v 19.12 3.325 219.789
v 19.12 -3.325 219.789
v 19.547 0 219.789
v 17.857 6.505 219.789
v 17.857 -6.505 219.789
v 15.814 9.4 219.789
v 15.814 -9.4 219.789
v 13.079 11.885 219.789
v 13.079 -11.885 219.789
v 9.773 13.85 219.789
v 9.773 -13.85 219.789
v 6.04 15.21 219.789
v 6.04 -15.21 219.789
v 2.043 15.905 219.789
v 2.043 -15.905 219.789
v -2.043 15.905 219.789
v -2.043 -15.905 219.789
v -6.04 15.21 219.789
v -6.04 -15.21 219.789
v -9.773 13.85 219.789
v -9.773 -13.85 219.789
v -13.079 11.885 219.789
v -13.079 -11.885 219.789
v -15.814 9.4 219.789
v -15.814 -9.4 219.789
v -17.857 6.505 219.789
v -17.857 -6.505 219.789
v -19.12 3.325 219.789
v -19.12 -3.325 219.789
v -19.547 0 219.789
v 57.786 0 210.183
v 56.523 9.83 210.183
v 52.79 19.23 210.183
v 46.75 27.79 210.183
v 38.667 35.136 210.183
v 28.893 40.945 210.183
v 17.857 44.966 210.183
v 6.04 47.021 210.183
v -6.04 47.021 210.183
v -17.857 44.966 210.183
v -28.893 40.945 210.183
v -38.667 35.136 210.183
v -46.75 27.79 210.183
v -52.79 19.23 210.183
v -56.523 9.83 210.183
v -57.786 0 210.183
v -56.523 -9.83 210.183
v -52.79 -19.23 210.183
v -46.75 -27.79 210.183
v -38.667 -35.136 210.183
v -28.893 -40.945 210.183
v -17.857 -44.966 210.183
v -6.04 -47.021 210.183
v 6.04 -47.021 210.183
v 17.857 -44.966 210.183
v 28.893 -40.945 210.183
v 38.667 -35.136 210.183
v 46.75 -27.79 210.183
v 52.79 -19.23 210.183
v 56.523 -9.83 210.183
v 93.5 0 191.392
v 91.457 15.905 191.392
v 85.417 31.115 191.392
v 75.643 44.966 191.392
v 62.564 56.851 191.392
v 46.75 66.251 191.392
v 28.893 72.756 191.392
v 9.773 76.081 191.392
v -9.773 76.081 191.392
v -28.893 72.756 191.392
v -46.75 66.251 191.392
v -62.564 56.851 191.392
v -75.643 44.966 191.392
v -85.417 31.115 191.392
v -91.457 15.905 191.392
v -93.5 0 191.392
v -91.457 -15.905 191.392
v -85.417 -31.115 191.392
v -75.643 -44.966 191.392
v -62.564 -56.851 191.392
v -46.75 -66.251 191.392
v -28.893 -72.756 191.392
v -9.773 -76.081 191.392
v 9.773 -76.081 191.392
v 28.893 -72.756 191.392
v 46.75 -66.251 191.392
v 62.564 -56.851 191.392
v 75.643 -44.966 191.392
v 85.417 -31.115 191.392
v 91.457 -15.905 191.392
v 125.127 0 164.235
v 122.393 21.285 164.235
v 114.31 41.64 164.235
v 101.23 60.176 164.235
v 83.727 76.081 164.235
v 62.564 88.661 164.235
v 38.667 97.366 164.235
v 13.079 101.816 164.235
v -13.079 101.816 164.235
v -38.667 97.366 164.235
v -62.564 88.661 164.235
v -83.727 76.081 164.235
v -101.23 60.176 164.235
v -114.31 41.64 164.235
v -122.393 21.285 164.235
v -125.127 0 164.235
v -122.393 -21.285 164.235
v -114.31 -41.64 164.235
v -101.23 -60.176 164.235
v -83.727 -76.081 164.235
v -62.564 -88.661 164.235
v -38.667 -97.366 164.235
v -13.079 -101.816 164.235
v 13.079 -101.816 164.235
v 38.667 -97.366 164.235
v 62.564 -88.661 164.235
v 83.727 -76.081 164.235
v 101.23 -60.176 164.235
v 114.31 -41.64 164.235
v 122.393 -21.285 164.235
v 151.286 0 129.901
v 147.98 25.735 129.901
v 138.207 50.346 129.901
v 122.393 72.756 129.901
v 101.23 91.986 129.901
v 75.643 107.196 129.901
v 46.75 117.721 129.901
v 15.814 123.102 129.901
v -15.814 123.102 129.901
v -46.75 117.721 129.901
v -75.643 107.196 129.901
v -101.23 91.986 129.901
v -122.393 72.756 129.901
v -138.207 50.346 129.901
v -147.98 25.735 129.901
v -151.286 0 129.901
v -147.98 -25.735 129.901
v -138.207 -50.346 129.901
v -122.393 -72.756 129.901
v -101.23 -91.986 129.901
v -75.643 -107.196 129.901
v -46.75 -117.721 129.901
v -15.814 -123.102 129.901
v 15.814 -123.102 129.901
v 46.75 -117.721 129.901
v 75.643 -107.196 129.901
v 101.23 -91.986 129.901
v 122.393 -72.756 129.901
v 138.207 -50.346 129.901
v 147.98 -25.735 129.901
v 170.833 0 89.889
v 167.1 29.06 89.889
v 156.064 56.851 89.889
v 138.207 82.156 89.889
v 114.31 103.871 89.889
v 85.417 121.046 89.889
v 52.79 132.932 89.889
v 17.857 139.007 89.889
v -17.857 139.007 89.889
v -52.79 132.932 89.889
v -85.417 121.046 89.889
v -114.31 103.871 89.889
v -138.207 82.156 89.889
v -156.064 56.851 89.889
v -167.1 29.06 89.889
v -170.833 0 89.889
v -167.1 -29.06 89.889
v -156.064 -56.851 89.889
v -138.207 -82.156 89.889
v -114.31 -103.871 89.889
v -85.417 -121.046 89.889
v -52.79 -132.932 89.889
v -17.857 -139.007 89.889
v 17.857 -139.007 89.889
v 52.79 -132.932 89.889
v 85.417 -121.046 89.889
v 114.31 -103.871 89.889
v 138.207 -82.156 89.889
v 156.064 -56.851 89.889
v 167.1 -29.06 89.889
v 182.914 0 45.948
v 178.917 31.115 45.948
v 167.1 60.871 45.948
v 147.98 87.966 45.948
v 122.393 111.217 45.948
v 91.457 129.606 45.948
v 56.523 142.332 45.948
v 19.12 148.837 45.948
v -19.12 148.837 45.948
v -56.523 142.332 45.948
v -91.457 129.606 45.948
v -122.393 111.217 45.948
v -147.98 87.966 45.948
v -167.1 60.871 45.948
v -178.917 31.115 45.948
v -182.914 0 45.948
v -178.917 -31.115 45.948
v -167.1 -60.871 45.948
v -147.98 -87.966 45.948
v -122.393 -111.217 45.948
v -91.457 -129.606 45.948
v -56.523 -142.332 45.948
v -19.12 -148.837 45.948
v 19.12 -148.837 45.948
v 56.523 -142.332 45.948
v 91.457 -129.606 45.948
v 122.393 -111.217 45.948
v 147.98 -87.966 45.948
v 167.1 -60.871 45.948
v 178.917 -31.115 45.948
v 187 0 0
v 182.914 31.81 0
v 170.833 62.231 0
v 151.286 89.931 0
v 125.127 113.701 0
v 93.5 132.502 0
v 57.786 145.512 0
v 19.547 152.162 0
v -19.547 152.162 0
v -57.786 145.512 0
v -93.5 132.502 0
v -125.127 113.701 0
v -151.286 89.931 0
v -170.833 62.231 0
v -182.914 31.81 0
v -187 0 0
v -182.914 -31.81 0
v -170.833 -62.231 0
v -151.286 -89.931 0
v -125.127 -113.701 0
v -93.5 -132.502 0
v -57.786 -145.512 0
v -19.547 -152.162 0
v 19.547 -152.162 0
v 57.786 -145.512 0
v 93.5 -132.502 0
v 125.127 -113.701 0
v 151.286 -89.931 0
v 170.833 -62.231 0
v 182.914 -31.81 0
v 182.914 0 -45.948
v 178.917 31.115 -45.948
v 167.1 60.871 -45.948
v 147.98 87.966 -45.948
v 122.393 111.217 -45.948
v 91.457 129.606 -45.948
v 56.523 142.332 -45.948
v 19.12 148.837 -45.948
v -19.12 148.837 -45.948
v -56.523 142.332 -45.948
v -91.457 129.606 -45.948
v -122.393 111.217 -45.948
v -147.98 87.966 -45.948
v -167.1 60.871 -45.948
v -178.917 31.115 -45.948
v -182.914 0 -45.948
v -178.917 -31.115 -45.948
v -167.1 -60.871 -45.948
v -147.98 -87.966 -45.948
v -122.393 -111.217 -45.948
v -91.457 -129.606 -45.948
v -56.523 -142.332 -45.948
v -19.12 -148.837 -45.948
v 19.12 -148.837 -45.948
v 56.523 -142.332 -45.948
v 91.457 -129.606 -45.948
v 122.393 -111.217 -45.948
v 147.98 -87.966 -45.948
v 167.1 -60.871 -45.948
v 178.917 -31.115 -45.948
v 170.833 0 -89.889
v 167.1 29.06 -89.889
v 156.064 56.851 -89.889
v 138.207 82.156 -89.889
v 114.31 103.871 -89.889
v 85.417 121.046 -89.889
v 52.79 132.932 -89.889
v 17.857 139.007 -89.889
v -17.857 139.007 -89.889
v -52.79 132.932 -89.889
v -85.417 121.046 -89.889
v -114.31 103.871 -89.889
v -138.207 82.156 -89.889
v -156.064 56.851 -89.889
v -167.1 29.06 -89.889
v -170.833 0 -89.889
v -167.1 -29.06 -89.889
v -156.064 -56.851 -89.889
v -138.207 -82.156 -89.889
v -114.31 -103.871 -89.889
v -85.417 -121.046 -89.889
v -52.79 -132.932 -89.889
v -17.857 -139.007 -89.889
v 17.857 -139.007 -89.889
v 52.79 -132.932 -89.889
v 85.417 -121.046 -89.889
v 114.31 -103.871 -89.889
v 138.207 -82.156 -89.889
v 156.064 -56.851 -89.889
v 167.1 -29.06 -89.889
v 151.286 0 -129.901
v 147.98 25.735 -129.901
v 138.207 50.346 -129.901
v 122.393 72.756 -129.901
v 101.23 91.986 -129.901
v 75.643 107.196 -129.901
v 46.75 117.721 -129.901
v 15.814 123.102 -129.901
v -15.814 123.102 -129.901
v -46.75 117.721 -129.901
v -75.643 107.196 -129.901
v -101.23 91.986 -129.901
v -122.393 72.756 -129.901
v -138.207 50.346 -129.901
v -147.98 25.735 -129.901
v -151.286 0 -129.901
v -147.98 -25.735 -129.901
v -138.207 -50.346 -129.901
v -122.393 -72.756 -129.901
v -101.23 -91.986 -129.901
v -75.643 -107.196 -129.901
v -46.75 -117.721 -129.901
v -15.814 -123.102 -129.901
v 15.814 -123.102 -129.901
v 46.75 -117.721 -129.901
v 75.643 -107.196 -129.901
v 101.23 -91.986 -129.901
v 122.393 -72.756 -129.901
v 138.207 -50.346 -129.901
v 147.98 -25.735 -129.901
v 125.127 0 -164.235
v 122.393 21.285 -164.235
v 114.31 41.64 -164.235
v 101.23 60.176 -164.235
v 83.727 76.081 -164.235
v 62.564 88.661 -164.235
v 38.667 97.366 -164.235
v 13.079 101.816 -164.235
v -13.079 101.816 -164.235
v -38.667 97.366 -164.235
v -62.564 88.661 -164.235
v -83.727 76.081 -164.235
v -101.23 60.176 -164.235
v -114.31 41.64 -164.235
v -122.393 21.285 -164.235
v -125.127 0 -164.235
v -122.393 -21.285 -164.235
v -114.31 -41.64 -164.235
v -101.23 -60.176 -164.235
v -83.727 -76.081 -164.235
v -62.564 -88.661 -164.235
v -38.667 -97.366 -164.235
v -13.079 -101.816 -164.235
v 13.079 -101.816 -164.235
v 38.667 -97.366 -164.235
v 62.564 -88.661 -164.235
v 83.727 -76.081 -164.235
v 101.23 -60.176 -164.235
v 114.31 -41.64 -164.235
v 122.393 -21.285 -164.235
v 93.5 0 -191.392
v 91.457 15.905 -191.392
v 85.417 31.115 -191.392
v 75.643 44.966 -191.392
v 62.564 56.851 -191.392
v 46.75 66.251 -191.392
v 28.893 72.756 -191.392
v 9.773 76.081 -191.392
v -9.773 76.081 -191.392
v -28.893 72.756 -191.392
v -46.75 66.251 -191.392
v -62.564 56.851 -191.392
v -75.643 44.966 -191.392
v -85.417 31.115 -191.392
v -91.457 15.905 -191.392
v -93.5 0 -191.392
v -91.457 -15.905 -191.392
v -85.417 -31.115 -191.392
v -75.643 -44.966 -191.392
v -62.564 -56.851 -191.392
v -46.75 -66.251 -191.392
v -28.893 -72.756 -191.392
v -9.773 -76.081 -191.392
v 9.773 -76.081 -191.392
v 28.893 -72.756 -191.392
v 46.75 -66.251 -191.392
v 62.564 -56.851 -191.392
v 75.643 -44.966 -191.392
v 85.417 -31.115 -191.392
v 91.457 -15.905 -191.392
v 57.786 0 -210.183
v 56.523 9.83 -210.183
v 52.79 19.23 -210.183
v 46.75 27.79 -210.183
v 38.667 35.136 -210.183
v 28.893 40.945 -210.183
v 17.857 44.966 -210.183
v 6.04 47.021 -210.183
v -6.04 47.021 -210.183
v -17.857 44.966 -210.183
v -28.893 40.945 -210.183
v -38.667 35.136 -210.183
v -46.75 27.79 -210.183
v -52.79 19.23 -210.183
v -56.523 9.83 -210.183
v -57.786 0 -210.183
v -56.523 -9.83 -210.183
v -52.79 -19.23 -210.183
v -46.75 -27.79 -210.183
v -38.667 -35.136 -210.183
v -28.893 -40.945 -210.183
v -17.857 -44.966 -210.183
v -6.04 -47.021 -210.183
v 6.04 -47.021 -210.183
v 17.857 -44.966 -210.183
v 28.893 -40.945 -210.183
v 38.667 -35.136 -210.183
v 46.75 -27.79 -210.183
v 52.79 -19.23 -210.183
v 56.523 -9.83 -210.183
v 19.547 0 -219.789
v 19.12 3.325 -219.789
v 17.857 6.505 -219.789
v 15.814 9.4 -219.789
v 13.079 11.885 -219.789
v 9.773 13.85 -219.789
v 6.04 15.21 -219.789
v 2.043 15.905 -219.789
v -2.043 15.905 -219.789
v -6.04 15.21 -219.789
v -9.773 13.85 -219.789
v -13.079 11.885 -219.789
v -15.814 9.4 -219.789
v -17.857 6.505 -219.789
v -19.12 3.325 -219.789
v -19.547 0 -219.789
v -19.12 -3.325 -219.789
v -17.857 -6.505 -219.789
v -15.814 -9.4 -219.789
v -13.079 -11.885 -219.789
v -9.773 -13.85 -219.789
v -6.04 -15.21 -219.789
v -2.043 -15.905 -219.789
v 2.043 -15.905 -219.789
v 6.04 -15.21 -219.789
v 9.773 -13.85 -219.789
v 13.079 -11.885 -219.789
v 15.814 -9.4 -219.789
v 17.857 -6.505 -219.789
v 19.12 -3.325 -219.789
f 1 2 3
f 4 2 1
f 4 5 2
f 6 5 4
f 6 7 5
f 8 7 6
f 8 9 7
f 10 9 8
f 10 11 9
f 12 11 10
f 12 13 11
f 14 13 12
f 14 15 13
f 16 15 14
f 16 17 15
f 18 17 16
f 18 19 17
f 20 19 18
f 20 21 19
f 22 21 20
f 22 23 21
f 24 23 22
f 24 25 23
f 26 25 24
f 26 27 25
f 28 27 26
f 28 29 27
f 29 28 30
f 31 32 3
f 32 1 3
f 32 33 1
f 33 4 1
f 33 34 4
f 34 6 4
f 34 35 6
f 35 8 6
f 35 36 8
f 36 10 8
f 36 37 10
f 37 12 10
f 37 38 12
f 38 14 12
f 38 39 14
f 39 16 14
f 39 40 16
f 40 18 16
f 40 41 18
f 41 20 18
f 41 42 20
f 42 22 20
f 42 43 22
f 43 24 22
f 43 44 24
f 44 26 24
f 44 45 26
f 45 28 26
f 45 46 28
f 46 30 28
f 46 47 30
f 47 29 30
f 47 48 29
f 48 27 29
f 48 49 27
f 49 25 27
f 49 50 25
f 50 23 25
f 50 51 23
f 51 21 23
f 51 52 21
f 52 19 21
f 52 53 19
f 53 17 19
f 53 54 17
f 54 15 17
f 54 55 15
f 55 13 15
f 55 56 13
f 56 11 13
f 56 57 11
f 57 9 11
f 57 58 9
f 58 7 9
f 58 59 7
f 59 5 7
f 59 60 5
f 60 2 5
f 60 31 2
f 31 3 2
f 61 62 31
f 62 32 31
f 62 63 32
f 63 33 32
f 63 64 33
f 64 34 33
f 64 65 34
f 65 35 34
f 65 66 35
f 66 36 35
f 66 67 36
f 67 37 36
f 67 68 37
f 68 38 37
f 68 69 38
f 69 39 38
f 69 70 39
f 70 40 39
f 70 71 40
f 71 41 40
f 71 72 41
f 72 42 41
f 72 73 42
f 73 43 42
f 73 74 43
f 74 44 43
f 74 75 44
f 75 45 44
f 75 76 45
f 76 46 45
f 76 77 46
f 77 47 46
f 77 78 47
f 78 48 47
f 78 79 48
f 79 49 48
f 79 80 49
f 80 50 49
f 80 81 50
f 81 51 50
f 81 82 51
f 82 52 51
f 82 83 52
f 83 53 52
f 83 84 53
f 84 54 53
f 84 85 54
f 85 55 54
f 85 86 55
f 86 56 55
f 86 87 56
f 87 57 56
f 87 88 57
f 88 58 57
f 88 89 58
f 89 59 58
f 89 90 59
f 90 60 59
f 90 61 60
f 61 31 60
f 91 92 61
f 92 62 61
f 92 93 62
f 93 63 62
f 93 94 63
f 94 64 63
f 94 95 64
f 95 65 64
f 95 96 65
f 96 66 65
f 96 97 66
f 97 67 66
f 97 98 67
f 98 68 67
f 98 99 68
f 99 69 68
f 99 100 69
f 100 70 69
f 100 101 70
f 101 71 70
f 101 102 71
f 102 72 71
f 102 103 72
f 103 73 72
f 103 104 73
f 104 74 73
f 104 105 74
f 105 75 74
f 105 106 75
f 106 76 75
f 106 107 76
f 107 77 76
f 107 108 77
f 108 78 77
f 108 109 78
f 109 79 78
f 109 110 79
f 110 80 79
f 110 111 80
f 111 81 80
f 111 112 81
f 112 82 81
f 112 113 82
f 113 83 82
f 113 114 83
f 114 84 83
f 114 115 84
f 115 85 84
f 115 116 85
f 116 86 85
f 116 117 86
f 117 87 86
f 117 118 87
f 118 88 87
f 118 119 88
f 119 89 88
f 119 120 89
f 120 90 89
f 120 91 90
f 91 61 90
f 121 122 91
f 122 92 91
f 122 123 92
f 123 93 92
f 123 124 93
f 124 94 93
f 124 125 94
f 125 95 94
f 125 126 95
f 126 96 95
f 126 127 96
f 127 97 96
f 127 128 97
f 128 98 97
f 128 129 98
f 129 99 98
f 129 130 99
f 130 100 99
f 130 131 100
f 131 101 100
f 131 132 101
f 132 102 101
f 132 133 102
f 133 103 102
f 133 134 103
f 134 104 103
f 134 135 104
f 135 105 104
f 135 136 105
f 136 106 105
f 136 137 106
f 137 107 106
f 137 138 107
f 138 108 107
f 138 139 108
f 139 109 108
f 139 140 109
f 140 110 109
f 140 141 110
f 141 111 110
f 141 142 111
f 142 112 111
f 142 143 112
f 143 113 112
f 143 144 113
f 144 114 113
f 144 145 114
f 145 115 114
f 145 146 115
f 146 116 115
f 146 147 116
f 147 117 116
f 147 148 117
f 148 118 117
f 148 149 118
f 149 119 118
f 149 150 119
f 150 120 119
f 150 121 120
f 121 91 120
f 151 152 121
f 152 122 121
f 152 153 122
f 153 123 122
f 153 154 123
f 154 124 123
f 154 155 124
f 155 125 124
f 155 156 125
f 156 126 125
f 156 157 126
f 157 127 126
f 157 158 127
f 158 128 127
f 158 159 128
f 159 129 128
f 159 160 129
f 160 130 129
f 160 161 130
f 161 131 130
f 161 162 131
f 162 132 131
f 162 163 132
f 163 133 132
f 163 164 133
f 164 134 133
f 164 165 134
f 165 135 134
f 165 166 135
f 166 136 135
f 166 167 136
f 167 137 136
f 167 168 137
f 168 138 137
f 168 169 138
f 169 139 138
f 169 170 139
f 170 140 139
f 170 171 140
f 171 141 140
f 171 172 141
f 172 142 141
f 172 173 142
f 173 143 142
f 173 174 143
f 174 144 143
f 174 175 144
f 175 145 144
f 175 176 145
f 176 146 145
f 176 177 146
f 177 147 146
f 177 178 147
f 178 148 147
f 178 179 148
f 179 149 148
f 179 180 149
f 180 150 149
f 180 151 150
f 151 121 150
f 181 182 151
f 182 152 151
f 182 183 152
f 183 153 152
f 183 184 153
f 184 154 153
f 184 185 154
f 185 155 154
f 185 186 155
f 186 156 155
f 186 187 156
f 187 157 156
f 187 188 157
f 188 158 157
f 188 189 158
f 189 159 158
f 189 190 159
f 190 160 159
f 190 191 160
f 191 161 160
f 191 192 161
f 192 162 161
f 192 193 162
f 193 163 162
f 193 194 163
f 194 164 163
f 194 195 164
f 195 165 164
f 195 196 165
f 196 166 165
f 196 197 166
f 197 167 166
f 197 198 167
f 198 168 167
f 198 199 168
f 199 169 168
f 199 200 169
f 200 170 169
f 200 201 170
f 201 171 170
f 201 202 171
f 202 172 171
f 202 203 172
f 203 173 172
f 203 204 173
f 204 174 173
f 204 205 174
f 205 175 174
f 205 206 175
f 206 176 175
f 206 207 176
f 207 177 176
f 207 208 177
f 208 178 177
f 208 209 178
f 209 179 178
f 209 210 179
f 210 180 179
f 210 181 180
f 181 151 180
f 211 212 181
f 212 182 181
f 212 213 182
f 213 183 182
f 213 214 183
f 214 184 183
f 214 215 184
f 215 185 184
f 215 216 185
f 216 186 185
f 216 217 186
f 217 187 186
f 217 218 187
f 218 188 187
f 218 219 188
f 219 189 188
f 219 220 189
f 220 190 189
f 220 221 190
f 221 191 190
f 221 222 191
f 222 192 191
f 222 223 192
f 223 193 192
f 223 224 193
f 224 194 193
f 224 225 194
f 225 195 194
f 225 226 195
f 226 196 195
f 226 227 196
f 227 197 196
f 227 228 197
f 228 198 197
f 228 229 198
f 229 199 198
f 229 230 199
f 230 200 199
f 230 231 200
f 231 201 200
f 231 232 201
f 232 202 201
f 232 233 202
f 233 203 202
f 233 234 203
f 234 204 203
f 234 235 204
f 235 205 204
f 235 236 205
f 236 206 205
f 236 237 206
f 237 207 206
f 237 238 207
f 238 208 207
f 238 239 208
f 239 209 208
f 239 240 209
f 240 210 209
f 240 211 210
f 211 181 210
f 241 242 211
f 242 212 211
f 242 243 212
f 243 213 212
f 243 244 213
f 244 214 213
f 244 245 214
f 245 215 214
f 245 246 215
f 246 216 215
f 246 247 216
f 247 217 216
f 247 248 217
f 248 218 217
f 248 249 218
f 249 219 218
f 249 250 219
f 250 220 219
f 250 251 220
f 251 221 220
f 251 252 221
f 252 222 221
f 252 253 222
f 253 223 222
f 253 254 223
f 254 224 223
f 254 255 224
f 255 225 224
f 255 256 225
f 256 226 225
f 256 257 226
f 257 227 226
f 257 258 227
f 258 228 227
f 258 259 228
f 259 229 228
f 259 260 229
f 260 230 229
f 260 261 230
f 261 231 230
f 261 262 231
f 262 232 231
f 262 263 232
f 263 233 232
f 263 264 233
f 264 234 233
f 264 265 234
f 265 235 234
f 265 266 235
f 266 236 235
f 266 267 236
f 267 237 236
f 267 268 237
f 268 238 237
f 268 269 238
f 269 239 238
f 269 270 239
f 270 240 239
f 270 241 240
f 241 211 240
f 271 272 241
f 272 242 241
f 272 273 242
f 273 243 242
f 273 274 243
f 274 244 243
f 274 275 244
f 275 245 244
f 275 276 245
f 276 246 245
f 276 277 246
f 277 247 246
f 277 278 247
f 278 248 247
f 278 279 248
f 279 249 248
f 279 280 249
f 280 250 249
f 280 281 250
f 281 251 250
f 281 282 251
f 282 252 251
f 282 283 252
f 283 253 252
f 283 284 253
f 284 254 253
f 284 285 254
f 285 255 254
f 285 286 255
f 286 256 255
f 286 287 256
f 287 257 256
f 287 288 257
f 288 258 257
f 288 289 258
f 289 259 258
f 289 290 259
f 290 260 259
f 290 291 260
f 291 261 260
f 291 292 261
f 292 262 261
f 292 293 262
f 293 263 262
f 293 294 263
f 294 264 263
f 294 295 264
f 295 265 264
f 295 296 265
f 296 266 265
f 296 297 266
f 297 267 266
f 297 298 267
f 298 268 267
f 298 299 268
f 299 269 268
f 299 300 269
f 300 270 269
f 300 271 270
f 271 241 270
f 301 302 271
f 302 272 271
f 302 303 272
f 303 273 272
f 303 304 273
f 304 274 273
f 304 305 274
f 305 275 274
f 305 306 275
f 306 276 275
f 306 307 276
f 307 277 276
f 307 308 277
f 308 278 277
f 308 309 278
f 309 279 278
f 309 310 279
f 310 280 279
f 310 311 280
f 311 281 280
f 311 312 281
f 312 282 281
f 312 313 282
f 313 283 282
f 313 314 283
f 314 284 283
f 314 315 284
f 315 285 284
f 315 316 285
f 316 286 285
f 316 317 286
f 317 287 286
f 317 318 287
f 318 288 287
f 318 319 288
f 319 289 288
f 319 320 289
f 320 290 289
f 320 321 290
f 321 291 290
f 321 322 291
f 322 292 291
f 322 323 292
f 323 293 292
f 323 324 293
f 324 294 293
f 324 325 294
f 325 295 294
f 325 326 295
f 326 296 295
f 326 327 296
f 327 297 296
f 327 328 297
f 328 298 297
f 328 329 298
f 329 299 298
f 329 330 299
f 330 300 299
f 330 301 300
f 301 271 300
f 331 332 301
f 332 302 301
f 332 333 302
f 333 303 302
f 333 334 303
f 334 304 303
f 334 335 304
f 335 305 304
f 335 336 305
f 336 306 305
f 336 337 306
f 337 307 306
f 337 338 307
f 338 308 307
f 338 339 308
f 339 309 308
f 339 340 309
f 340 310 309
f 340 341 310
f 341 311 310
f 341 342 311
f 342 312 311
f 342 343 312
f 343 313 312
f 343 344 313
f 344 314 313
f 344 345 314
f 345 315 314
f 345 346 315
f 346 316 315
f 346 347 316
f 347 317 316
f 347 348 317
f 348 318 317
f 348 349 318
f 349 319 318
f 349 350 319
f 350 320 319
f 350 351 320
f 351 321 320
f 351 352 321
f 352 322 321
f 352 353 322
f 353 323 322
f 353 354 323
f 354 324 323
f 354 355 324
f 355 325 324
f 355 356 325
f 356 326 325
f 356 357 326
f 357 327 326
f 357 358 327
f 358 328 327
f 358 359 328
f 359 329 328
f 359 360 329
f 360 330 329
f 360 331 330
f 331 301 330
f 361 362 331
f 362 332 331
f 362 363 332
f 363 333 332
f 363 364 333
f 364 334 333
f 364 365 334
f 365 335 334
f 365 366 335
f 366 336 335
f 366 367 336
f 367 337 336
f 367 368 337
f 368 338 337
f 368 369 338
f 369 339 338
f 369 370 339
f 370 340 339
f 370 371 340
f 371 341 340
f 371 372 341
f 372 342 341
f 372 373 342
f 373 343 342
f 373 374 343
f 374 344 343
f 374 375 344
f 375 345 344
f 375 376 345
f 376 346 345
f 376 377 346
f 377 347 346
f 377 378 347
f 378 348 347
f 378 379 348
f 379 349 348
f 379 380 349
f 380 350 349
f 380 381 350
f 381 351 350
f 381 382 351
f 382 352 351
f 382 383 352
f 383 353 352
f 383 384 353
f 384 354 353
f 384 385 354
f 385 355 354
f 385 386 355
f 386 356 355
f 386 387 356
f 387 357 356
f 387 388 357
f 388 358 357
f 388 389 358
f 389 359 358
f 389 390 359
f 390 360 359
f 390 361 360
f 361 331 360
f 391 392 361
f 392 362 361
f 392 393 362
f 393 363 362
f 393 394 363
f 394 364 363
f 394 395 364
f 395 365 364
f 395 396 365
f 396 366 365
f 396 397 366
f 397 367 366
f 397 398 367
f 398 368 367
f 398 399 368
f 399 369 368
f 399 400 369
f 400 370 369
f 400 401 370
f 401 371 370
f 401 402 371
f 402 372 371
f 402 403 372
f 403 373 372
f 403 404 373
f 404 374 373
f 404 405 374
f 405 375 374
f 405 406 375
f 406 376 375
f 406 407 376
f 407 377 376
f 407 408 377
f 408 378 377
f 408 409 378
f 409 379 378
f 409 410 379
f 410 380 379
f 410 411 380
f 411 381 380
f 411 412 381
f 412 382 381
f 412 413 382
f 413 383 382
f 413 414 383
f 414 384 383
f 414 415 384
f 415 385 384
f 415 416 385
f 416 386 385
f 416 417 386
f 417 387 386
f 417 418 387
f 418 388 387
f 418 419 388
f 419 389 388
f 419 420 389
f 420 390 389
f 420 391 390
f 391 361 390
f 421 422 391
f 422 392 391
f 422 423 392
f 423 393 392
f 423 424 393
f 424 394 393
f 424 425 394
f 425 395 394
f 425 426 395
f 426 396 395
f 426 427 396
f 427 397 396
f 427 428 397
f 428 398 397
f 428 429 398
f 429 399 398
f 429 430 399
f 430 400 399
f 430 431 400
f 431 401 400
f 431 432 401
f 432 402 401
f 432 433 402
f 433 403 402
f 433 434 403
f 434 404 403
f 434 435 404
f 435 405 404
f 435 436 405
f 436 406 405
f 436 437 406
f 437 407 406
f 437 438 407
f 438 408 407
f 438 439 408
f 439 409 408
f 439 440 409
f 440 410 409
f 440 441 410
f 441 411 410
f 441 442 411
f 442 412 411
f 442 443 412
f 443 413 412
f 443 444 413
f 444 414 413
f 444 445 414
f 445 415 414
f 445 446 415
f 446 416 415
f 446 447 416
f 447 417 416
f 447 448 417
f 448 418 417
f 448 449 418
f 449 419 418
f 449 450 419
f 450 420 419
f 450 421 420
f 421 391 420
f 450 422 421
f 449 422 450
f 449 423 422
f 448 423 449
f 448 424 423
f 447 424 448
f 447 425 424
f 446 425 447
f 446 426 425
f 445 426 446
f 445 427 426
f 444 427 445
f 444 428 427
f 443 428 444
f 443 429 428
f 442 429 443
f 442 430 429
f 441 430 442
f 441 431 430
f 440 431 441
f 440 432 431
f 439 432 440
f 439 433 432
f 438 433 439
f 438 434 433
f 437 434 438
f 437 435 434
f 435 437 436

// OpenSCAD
// Generated by SolidPython 1.0.1 on 2020-07-29 00:46:49


scale(v = [11, 9, 13]) {
	sphere(r = 17);
}
/***********************************************
*********      SolidPython code:      **********
************************************************
 
# import packages: SolidPython
from solid import *
from solid.utils import *
from itertools import chain, combinations, permutations


class Resize:

    def __init__(self, scad_file):
        self.scad_file = scad_file
        #self.scad_file = import_scad(scad_file)
        # cone/cylinder param:
        self.r1 = 0
        self.r2 = 0
        self.h = 0
        # rectangular prism param:
        self.w = 0
        self.l = 0
        # ellipse param:
        self.r = 0

    # import OpenScad code (file name corresponds to shape)


    # classify shape + parameters
    def assign(self, param1, param2, param3):
        if self.scad_file == 'cone.scad':
            self.r1 = param1
            self.r2 = param2
            self.h = param3
        elif self.scad_file == 'cylinder.scad':
            self.r1 = param1
            self.r2 = param2
            self.h = param3
        elif self.scad_file == 'rectangularPrism.scad':
            self.h = param1
            self.l = param2
            self.w = param3
        else:
            self.r = param1
            self.h = param2

    # resize parameters
    def iterate(self):
        x = range(3, 20, 2)
        i = 1
        if self.scad_file == 'cone.scad':
            tempList = list(permutations(x, 2))
            for temp in tempList:
                param1 = temp[0]
                param2 = temp[1]
                filepath = 'produced_scad_files/' + 'cone' + str(param1) + '_' + str(param2) + '_' + '.scad'
                scad_render_to_file(cylinder(h=param1, r1=param2, r2=0), filepath)

        elif self.scad_file == 'cylinder.scad':
            tempList = list(permutations(x, 3))
            for temp in tempList:
                param1 = temp[0]
                param2 = temp[1]
                filepath = 'produced_scad_files/' + 'cylinder' + str(param1) + '_' + str(param2) + '_' + '.scad'
                scad_render_to_file(cylinder(h=param1, r1=param2, r2=param2), filepath)

        elif self.scad_file == 'rectangularPrism.scad':
            tempList = list(permutations(x, 3))
            for temp in tempList:
                param1 = temp[0]
                param2 = temp[1]
                param3 = temp[2]
                filepath = 'produced_scad_files/' + 'rectangularPrism' + str(param1) + '_' + str(param2) + '_' + str(
                    param3) + '.scad'
                scad_render_to_file(cube(size=(param1, param2, param3)), filepath)

        elif self.scad_file == 'ellipse.scad':
            tempList = list(permutations(x, 4))
            for temp in tempList:
                param1 = temp[0]
                param2 = temp[1]
                param3 = temp[2]
                param4 = temp[3]
                filepath = 'produced_scad_files/' + 'ellipse' + str(param1) + '_' + str(param2) + '_' + str(param3) + '_' + str(param4) + '.scad'
                scad_render_to_file(scale([param1, param2, param3])(sphere(r=param4)), filepath)

    def render_to_scadfile(self):
        scad_render_to_file(scad, 'example.scad') 
 
************************************************/
